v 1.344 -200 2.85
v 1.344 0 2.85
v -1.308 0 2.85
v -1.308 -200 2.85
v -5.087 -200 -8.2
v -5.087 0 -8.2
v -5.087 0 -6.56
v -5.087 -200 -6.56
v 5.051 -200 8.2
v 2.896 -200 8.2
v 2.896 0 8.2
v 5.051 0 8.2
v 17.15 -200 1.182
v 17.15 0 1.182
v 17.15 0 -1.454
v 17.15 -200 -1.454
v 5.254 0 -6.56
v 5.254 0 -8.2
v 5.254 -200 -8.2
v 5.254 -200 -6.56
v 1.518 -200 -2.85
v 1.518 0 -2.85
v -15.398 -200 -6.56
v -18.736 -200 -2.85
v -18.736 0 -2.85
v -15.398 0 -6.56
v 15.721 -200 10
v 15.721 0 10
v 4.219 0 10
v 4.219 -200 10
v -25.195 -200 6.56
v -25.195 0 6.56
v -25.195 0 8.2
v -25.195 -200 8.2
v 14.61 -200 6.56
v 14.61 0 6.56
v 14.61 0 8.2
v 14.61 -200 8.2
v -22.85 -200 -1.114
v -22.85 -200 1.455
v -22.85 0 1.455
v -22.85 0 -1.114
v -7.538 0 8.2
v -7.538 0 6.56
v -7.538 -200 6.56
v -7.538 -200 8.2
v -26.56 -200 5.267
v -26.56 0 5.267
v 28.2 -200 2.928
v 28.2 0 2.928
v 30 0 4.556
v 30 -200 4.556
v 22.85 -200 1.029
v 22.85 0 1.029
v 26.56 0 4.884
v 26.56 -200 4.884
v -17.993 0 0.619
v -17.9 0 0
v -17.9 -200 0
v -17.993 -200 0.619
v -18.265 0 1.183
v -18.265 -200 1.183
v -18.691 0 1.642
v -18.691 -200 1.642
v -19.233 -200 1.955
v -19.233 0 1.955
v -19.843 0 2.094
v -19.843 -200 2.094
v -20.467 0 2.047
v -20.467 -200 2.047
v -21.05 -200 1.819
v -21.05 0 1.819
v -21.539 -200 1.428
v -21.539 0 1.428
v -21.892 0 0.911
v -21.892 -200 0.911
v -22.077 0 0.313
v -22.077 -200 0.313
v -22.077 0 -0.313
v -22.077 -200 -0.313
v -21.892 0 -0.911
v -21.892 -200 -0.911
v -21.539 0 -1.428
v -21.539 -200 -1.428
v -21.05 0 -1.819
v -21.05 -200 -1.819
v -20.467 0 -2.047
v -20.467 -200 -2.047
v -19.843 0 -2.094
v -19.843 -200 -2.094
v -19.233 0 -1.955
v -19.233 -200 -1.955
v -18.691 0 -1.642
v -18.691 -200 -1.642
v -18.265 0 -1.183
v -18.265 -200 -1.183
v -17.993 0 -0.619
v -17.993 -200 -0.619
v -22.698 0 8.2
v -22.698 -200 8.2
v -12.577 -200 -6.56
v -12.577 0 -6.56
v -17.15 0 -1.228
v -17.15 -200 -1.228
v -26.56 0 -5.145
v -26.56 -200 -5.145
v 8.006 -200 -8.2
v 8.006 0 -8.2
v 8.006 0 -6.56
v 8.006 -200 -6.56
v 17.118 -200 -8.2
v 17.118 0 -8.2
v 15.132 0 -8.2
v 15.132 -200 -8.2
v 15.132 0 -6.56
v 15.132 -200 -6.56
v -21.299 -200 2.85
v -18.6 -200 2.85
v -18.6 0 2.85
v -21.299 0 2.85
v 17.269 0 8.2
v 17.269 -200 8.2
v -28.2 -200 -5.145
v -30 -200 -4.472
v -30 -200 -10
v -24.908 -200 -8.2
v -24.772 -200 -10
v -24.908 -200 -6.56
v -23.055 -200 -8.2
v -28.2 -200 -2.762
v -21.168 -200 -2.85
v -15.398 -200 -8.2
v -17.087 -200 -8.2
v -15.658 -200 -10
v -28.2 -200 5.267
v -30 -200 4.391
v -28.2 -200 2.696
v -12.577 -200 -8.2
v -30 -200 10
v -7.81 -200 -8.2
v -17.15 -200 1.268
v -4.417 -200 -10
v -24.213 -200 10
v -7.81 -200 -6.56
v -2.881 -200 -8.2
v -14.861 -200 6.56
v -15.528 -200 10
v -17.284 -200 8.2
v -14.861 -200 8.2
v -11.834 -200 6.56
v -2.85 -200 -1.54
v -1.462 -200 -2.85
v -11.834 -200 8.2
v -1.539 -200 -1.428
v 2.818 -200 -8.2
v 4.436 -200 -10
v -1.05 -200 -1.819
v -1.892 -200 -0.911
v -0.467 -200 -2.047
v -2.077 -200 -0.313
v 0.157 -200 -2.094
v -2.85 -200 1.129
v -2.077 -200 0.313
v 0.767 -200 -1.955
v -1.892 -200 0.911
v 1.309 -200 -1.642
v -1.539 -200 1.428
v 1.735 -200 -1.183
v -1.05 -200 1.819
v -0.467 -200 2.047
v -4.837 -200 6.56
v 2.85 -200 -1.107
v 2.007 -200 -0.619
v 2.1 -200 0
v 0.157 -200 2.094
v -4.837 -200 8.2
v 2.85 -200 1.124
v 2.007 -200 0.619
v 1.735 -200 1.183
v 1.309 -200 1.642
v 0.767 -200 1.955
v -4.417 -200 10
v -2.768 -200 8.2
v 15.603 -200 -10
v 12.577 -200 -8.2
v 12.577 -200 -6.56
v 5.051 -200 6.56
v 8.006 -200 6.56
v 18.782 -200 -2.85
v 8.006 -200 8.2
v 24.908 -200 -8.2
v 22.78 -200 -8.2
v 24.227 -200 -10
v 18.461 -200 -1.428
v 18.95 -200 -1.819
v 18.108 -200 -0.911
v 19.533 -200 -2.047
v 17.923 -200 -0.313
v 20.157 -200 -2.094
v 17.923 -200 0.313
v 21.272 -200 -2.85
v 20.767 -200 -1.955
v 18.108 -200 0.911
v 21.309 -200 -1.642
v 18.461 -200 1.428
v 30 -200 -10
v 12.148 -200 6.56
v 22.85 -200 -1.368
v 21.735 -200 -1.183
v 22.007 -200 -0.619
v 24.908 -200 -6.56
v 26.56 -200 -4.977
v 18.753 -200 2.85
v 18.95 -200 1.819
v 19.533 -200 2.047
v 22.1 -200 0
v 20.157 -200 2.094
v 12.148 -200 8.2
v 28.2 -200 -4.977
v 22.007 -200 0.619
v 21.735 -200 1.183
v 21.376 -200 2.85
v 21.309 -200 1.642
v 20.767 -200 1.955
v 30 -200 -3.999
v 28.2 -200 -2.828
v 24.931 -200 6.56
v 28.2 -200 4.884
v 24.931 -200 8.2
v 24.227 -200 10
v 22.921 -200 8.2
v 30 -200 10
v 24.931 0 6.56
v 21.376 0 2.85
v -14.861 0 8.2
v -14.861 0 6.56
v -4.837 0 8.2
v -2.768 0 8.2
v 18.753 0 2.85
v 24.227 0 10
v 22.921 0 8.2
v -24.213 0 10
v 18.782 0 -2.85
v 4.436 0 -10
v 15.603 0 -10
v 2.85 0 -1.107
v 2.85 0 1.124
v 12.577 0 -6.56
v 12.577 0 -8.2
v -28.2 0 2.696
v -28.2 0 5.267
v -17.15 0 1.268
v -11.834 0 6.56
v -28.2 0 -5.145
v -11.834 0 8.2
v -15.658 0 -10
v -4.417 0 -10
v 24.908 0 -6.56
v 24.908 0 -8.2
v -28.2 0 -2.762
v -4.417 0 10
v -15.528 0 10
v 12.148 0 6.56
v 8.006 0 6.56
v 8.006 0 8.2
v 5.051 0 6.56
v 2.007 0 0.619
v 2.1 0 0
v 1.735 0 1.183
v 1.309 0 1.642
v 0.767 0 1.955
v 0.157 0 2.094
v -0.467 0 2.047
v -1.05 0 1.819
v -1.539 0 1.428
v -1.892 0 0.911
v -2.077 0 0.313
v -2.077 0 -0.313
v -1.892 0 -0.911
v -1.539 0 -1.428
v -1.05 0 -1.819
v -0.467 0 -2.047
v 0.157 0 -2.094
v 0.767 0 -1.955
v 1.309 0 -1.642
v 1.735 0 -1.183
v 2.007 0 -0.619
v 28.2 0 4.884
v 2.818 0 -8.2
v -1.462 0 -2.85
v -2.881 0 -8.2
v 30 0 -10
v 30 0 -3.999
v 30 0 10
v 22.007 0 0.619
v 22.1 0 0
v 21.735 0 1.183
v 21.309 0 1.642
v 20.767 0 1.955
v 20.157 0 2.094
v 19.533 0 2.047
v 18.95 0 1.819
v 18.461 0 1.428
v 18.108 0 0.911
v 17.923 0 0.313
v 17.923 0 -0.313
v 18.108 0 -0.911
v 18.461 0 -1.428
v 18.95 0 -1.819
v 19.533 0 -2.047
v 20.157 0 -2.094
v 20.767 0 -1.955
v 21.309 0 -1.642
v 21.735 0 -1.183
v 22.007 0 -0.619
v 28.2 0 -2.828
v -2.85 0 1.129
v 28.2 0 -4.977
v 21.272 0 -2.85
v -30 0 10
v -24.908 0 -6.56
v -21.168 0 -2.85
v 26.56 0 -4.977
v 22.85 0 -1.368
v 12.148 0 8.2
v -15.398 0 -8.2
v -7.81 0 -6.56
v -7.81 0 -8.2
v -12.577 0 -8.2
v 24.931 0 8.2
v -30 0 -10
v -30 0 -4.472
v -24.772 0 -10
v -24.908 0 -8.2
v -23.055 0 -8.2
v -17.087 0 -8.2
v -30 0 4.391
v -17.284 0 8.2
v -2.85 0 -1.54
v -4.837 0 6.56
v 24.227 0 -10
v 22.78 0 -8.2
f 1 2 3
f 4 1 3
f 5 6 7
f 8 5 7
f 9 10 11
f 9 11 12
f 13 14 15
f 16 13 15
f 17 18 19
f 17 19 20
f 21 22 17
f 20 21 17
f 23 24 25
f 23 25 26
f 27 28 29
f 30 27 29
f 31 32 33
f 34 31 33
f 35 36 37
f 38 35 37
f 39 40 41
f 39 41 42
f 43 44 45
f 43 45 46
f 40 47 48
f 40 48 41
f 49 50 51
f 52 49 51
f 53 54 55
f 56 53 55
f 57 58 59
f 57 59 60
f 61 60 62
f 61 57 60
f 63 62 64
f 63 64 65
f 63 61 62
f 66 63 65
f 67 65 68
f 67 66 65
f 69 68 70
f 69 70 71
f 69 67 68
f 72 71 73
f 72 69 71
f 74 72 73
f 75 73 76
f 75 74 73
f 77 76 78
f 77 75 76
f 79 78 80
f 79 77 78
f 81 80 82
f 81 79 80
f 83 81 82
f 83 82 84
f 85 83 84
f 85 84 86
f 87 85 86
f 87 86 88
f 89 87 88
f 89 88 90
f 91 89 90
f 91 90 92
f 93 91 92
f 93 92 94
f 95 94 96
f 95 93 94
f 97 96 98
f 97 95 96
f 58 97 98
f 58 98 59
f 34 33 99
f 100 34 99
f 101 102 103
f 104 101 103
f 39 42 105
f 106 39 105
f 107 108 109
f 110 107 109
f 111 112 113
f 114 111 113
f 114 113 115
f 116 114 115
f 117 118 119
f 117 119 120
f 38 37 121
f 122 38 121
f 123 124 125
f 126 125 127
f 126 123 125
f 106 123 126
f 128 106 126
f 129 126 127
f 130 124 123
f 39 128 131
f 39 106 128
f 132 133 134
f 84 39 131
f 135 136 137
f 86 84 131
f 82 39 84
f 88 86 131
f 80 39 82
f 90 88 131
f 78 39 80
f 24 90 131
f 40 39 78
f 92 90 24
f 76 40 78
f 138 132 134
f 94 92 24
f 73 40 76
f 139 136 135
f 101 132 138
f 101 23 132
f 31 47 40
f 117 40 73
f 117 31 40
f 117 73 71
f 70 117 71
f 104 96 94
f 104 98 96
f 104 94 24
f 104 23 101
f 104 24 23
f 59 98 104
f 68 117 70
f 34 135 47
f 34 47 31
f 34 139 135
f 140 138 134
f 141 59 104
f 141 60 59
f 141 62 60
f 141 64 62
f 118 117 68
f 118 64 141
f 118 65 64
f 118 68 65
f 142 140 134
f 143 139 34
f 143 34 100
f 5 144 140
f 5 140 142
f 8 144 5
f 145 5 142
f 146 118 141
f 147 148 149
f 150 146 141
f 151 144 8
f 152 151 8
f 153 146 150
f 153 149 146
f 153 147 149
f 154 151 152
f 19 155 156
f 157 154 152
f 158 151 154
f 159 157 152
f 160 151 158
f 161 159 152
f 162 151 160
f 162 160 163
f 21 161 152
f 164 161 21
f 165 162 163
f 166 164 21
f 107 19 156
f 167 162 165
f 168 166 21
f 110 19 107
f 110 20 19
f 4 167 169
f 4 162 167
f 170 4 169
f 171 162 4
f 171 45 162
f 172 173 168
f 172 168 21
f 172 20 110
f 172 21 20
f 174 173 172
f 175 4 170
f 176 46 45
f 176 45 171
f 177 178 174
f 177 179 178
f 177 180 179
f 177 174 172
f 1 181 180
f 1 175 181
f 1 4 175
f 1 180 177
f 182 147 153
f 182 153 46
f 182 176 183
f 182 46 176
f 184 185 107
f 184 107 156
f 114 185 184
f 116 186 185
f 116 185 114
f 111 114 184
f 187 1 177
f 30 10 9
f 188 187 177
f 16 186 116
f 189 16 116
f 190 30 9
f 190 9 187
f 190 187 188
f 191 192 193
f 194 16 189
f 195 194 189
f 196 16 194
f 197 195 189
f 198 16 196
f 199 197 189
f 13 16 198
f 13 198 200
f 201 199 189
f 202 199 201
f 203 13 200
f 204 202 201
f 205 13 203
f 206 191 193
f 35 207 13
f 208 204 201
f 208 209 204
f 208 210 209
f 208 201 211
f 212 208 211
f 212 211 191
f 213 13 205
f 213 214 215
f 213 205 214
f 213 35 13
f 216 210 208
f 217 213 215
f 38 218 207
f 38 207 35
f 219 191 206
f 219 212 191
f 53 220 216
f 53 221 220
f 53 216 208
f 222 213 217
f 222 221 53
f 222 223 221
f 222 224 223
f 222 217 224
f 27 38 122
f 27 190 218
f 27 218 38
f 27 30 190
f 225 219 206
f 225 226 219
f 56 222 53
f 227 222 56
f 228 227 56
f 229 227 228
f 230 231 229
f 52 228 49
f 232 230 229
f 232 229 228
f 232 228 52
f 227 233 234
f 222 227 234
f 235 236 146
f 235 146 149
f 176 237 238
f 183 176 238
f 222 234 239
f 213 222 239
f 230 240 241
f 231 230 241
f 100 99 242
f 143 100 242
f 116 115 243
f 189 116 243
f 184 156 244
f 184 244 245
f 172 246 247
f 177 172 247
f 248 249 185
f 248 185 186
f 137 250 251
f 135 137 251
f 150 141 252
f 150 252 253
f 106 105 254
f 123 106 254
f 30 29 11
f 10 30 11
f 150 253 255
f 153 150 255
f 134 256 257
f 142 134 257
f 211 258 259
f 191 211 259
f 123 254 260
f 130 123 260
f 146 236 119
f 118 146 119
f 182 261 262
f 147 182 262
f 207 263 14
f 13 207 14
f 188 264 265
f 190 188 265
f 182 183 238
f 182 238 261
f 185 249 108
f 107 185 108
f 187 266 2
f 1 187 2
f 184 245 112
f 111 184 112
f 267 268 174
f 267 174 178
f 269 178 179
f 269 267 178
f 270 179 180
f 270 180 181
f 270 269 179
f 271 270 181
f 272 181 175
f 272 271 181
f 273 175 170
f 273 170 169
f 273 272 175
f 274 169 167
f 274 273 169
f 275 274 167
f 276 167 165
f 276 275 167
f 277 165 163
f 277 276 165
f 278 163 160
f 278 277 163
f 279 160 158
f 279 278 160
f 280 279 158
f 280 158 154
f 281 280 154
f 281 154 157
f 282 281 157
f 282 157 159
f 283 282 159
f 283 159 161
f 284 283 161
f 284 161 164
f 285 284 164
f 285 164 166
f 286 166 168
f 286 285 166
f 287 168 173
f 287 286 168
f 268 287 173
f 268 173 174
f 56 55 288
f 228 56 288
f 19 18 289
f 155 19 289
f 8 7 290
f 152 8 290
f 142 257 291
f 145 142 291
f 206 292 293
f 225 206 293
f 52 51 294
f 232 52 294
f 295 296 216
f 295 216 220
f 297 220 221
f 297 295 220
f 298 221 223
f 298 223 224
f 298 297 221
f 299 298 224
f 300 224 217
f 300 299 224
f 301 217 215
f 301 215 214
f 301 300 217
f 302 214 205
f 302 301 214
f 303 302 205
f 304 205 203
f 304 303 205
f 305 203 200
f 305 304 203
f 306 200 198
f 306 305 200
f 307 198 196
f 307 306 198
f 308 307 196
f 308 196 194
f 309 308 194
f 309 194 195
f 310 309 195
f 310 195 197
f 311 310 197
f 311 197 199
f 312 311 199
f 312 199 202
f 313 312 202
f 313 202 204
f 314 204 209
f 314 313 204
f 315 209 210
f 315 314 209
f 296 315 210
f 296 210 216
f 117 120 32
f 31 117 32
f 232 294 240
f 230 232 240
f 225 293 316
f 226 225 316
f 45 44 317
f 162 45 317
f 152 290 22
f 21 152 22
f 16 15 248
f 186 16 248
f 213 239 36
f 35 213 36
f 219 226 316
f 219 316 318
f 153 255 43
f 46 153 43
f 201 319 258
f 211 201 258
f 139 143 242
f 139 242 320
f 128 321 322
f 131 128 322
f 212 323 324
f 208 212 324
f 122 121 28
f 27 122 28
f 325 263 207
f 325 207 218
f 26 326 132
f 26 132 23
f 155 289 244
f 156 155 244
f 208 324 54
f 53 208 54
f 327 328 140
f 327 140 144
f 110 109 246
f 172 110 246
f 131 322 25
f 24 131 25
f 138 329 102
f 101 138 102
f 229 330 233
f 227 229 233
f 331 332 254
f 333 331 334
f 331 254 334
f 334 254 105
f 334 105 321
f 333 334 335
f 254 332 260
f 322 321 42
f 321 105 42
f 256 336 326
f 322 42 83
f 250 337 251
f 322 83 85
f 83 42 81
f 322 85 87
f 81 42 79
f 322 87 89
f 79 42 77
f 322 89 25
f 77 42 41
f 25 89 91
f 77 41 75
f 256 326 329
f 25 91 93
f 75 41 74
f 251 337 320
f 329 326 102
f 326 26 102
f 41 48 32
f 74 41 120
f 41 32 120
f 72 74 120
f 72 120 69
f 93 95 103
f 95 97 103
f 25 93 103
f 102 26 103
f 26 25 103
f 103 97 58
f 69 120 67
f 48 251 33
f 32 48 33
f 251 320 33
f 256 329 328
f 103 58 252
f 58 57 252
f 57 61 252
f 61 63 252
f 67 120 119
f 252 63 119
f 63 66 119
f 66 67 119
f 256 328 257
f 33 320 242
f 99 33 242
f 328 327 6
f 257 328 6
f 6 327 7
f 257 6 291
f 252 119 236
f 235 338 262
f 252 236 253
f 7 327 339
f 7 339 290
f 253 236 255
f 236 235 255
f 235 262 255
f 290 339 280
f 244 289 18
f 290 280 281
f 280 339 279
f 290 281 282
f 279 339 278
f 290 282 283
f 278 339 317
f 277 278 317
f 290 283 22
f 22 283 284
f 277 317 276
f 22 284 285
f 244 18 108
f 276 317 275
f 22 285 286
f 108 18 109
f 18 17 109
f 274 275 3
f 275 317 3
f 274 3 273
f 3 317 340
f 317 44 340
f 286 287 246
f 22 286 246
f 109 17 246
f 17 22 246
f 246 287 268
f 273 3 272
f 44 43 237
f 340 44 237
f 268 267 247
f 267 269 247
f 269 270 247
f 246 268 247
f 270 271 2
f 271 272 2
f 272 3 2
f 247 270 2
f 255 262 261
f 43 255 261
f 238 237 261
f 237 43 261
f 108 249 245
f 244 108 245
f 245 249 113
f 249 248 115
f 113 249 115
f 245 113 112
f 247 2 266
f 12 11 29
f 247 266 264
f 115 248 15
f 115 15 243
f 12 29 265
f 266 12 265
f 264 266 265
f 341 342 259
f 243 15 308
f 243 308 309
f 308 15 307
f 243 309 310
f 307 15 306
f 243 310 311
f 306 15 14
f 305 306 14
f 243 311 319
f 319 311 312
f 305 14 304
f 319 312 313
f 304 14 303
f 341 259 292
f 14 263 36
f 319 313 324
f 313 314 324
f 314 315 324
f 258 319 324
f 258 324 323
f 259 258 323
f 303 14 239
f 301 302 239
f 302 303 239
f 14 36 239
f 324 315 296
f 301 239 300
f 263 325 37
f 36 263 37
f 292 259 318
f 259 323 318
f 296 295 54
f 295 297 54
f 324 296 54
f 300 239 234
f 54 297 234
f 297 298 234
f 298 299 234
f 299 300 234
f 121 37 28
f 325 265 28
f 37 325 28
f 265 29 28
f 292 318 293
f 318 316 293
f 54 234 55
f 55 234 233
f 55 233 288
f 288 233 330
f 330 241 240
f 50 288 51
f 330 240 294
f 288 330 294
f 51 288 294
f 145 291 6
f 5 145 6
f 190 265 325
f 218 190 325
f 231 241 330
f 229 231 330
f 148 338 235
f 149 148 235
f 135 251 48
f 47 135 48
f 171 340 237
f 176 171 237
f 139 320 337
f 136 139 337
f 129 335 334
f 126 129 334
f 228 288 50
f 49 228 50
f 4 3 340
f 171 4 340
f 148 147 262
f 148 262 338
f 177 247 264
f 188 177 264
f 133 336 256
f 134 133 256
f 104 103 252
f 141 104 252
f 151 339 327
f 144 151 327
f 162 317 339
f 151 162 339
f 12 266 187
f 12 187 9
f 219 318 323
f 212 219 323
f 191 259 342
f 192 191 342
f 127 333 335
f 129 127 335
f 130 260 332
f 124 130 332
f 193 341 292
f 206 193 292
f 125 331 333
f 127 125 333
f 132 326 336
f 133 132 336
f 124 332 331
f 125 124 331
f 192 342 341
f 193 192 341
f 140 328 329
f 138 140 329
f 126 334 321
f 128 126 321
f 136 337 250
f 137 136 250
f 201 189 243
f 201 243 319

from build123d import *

# Parameters (mm, degrees)
F0_R     = 2.1
F0_W     = 2.462149
F0_H     = 1.64
F0_W_2   = 2.954578
F0_W_3   = 2.554638
F0_W_4   = 2.751813
F0_W_5   = 2.700622
F0_W_6   = 3.026464
F0_W_7   = 2.722847
F0_W_8   = 2.821042
F1_DEPTH = 200


with BuildPart() as f1:
    # F0 (on Front) → F1 (new body)
    with BuildSketch(Plane.XZ):
        Polygon((30, 4.555675), (30, 10), (24.22707, 10), (22.920883, 8.2), (24.930604, 8.2), (28.2, 8.2), (28.2, 4.884325), (28.2, 2.928185), align=None)
        Polygon((28.2, 8.2), (24.930604, 8.2), (24.930604, 6.56), (26.56, 6.56), (26.56, 4.884325), (28.2, 4.884325), align=None)
        Polygon((26.56, 6.56), (24.930604, 6.56), (21.376314, 2.85), (22.85, 2.85), (22.85, 1.029287), (26.56, 4.884325), align=None)
        Polygon((28.2, -4.97699), (26.56, -4.97699), (26.56, -6.56), (24.907887, -6.56), (24.907887, -8.2), (28.2, -8.2), align=None)
        Polygon((28.2, -2.827582), (28.2, -4.97699), (28.2, -8.2), (24.907887, -8.2), (22.780269, -8.2), (24.227049, -10), (30, -10), (30, -3.998783), align=None)
        Polygon((26.56, -4.97699), (22.85, -1.368018), (22.85, -2.85), (21.271573, -2.85), (24.907887, -6.56), (26.56, -6.56), align=None)
        Polygon((22.85, 2.85), (21.376314, 2.85), (18.752582, 2.85), (17.15, 2.85), (17.15, 1.181537), (17.15, -1.454411), (17.15, -2.85), (18.781548, -2.85), (21.271573, -2.85), (22.85, -2.85), (22.85, -1.368018), (22.85, 1.029287), align=None)
        with Locations((20, 0)):
            Circle(F0_R, mode=Mode.SUBTRACT)
        Polygon((17.15, 2.85), (18.752582, 2.85), (14.610378, 6.56), (12.148229, 6.56), (17.15, 1.181537), align=None)
        with Locations((13.379303, 7.38)):
            Rectangle(F0_W, F0_H)
        Polygon((12.148229, 8.2), (14.610378, 8.2), (17.26873, 8.2), (15.720541, 10), (4.219369, 10), (2.896034, 8.2), (5.051448, 8.2), (8.006026, 8.2), align=None)
        with Locations((6.528737, 7.38)):
            Rectangle(F0_W_2, F0_H)
        Polygon((2.85, 1.123604), (8.006026, 6.56), (5.051448, 6.56), (1.343741, 2.85), (2.85, 2.85), align=None)
        Polygon((17.15, -2.85), (17.15, -1.454411), (12.577136, -6.56), (15.131774, -6.56), (18.781548, -2.85), align=None)
        with Locations((13.854455, -7.38)):
            Rectangle(F0_W_3, F0_H)
        Polygon((15.131774, -8.2), (12.577136, -8.2), (8.006026, -8.2), (5.254213, -8.2), (2.818424, -8.2), (4.436373, -10), (15.602568, -10), (17.118241, -8.2), align=None)
        with Locations((6.63012, -7.38)):
            Rectangle(F0_W_4, F0_H)
        Polygon((5.254213, -6.56), (8.006026, -6.56), (2.85, -1.106813), (2.85, -2.85), (1.51754, -2.85), align=None)
        Polygon((2.85, -1.106813), (2.85, 1.123604), (2.85, 2.85), (1.343741, 2.85), (-1.308073, 2.85), (-2.85, 2.85), (-2.85, 1.129449), (-2.85, -1.540485), (-2.85, -2.85), (-1.461518, -2.85), (1.51754, -2.85), (2.85, -2.85), align=None)
        Circle(F0_R, mode=Mode.SUBTRACT)
        Polygon((-2.85, 2.85), (-1.308073, 2.85), (-4.837296, 6.56), (-7.537918, 6.56), (-2.85, 1.129449), align=None)
        with Locations((-6.187607, 7.38)):
            Rectangle(F0_W_5, F0_H)
        Polygon((-7.537918, 8.2), (-4.837296, 8.2), (-2.768134, 8.2), (-4.417359, 10), (-15.527925, 10), (-17.283811, 8.2), (-14.860827, 8.2), (-11.834363, 8.2), align=None)
        with Locations((-13.347595, 7.38)):
            Rectangle(F0_W_6, F0_H)
        Polygon((-17.15, 1.267669), (-11.834363, 6.56), (-14.860827, 6.56), (-18.599909, 2.85), (-17.15, 2.85), align=None)
        Polygon((-5.086812, -6.56), (-1.461518, -2.85), (-2.85, -2.85), (-2.85, -1.540485), (-7.809659, -6.56), align=None)
        with Locations((-6.448236, -7.38)):
            Rectangle(F0_W_7, F0_H)
        Polygon((-2.881428, -8.2), (-5.086812, -8.2), (-7.809659, -8.2), (-12.576681, -8.2), (-15.397723, -8.2), (-17.08678, -8.2), (-15.658125, -10), (-4.417359, -10), align=None)
        with Locations((-13.987202, -7.38)):
            Rectangle(F0_W_8, F0_H)
        Polygon((-15.397723, -6.56), (-12.576681, -6.56), (-17.15, -1.227868), (-17.15, -2.85), (-18.736489, -2.85), align=None)
        Polygon((-17.15, -1.227868), (-17.15, 1.267669), (-17.15, 2.85), (-18.599909, 2.85), (-21.29855, 2.85), (-22.85, 2.85), (-22.85, 1.455018), (-22.85, -1.113568), (-22.85, -2.85), (-21.168495, -2.85), (-18.736489, -2.85), (-17.15, -2.85), align=None)
        with Locations((-20, 0)):
            Circle(F0_R, mode=Mode.SUBTRACT)
        Polygon((-22.85, 2.85), (-21.29855, 2.85), (-25.195252, 6.56), (-26.56, 6.56), (-26.56, 5.266924), (-22.85, 1.455018), align=None)
        Polygon((-24.907576, -6.56), (-21.168495, -2.85), (-22.85, -2.85), (-22.85, -1.113568), (-26.56, -5.145273), (-26.56, -6.56), align=None)
        Polygon((-26.56, 6.56), (-25.195252, 6.56), (-25.195252, 8.2), (-28.2, 8.2), (-28.2, 5.266924), (-26.56, 5.266924), align=None)
        Polygon((-28.2, 8.2), (-25.195252, 8.2), (-22.697506, 8.2), (-24.213179, 10), (-30, 10), (-30, 4.390912), (-28.2, 2.696034), (-28.2, 5.266924), align=None)
        Polygon((-24.907576, -8.2), (-24.907576, -6.56), (-26.56, -6.56), (-26.56, -5.145273), (-28.2, -5.145273), (-28.2, -8.2), align=None)
        Polygon((-23.055149, -8.2), (-24.907576, -8.2), (-28.2, -8.2), (-28.2, -5.145273), (-28.2, -2.76243), (-30, -4.472366), (-30, -10), (-24.772262, -10), align=None)
    extrude(amount=F1_DEPTH)


solid = f1.part
